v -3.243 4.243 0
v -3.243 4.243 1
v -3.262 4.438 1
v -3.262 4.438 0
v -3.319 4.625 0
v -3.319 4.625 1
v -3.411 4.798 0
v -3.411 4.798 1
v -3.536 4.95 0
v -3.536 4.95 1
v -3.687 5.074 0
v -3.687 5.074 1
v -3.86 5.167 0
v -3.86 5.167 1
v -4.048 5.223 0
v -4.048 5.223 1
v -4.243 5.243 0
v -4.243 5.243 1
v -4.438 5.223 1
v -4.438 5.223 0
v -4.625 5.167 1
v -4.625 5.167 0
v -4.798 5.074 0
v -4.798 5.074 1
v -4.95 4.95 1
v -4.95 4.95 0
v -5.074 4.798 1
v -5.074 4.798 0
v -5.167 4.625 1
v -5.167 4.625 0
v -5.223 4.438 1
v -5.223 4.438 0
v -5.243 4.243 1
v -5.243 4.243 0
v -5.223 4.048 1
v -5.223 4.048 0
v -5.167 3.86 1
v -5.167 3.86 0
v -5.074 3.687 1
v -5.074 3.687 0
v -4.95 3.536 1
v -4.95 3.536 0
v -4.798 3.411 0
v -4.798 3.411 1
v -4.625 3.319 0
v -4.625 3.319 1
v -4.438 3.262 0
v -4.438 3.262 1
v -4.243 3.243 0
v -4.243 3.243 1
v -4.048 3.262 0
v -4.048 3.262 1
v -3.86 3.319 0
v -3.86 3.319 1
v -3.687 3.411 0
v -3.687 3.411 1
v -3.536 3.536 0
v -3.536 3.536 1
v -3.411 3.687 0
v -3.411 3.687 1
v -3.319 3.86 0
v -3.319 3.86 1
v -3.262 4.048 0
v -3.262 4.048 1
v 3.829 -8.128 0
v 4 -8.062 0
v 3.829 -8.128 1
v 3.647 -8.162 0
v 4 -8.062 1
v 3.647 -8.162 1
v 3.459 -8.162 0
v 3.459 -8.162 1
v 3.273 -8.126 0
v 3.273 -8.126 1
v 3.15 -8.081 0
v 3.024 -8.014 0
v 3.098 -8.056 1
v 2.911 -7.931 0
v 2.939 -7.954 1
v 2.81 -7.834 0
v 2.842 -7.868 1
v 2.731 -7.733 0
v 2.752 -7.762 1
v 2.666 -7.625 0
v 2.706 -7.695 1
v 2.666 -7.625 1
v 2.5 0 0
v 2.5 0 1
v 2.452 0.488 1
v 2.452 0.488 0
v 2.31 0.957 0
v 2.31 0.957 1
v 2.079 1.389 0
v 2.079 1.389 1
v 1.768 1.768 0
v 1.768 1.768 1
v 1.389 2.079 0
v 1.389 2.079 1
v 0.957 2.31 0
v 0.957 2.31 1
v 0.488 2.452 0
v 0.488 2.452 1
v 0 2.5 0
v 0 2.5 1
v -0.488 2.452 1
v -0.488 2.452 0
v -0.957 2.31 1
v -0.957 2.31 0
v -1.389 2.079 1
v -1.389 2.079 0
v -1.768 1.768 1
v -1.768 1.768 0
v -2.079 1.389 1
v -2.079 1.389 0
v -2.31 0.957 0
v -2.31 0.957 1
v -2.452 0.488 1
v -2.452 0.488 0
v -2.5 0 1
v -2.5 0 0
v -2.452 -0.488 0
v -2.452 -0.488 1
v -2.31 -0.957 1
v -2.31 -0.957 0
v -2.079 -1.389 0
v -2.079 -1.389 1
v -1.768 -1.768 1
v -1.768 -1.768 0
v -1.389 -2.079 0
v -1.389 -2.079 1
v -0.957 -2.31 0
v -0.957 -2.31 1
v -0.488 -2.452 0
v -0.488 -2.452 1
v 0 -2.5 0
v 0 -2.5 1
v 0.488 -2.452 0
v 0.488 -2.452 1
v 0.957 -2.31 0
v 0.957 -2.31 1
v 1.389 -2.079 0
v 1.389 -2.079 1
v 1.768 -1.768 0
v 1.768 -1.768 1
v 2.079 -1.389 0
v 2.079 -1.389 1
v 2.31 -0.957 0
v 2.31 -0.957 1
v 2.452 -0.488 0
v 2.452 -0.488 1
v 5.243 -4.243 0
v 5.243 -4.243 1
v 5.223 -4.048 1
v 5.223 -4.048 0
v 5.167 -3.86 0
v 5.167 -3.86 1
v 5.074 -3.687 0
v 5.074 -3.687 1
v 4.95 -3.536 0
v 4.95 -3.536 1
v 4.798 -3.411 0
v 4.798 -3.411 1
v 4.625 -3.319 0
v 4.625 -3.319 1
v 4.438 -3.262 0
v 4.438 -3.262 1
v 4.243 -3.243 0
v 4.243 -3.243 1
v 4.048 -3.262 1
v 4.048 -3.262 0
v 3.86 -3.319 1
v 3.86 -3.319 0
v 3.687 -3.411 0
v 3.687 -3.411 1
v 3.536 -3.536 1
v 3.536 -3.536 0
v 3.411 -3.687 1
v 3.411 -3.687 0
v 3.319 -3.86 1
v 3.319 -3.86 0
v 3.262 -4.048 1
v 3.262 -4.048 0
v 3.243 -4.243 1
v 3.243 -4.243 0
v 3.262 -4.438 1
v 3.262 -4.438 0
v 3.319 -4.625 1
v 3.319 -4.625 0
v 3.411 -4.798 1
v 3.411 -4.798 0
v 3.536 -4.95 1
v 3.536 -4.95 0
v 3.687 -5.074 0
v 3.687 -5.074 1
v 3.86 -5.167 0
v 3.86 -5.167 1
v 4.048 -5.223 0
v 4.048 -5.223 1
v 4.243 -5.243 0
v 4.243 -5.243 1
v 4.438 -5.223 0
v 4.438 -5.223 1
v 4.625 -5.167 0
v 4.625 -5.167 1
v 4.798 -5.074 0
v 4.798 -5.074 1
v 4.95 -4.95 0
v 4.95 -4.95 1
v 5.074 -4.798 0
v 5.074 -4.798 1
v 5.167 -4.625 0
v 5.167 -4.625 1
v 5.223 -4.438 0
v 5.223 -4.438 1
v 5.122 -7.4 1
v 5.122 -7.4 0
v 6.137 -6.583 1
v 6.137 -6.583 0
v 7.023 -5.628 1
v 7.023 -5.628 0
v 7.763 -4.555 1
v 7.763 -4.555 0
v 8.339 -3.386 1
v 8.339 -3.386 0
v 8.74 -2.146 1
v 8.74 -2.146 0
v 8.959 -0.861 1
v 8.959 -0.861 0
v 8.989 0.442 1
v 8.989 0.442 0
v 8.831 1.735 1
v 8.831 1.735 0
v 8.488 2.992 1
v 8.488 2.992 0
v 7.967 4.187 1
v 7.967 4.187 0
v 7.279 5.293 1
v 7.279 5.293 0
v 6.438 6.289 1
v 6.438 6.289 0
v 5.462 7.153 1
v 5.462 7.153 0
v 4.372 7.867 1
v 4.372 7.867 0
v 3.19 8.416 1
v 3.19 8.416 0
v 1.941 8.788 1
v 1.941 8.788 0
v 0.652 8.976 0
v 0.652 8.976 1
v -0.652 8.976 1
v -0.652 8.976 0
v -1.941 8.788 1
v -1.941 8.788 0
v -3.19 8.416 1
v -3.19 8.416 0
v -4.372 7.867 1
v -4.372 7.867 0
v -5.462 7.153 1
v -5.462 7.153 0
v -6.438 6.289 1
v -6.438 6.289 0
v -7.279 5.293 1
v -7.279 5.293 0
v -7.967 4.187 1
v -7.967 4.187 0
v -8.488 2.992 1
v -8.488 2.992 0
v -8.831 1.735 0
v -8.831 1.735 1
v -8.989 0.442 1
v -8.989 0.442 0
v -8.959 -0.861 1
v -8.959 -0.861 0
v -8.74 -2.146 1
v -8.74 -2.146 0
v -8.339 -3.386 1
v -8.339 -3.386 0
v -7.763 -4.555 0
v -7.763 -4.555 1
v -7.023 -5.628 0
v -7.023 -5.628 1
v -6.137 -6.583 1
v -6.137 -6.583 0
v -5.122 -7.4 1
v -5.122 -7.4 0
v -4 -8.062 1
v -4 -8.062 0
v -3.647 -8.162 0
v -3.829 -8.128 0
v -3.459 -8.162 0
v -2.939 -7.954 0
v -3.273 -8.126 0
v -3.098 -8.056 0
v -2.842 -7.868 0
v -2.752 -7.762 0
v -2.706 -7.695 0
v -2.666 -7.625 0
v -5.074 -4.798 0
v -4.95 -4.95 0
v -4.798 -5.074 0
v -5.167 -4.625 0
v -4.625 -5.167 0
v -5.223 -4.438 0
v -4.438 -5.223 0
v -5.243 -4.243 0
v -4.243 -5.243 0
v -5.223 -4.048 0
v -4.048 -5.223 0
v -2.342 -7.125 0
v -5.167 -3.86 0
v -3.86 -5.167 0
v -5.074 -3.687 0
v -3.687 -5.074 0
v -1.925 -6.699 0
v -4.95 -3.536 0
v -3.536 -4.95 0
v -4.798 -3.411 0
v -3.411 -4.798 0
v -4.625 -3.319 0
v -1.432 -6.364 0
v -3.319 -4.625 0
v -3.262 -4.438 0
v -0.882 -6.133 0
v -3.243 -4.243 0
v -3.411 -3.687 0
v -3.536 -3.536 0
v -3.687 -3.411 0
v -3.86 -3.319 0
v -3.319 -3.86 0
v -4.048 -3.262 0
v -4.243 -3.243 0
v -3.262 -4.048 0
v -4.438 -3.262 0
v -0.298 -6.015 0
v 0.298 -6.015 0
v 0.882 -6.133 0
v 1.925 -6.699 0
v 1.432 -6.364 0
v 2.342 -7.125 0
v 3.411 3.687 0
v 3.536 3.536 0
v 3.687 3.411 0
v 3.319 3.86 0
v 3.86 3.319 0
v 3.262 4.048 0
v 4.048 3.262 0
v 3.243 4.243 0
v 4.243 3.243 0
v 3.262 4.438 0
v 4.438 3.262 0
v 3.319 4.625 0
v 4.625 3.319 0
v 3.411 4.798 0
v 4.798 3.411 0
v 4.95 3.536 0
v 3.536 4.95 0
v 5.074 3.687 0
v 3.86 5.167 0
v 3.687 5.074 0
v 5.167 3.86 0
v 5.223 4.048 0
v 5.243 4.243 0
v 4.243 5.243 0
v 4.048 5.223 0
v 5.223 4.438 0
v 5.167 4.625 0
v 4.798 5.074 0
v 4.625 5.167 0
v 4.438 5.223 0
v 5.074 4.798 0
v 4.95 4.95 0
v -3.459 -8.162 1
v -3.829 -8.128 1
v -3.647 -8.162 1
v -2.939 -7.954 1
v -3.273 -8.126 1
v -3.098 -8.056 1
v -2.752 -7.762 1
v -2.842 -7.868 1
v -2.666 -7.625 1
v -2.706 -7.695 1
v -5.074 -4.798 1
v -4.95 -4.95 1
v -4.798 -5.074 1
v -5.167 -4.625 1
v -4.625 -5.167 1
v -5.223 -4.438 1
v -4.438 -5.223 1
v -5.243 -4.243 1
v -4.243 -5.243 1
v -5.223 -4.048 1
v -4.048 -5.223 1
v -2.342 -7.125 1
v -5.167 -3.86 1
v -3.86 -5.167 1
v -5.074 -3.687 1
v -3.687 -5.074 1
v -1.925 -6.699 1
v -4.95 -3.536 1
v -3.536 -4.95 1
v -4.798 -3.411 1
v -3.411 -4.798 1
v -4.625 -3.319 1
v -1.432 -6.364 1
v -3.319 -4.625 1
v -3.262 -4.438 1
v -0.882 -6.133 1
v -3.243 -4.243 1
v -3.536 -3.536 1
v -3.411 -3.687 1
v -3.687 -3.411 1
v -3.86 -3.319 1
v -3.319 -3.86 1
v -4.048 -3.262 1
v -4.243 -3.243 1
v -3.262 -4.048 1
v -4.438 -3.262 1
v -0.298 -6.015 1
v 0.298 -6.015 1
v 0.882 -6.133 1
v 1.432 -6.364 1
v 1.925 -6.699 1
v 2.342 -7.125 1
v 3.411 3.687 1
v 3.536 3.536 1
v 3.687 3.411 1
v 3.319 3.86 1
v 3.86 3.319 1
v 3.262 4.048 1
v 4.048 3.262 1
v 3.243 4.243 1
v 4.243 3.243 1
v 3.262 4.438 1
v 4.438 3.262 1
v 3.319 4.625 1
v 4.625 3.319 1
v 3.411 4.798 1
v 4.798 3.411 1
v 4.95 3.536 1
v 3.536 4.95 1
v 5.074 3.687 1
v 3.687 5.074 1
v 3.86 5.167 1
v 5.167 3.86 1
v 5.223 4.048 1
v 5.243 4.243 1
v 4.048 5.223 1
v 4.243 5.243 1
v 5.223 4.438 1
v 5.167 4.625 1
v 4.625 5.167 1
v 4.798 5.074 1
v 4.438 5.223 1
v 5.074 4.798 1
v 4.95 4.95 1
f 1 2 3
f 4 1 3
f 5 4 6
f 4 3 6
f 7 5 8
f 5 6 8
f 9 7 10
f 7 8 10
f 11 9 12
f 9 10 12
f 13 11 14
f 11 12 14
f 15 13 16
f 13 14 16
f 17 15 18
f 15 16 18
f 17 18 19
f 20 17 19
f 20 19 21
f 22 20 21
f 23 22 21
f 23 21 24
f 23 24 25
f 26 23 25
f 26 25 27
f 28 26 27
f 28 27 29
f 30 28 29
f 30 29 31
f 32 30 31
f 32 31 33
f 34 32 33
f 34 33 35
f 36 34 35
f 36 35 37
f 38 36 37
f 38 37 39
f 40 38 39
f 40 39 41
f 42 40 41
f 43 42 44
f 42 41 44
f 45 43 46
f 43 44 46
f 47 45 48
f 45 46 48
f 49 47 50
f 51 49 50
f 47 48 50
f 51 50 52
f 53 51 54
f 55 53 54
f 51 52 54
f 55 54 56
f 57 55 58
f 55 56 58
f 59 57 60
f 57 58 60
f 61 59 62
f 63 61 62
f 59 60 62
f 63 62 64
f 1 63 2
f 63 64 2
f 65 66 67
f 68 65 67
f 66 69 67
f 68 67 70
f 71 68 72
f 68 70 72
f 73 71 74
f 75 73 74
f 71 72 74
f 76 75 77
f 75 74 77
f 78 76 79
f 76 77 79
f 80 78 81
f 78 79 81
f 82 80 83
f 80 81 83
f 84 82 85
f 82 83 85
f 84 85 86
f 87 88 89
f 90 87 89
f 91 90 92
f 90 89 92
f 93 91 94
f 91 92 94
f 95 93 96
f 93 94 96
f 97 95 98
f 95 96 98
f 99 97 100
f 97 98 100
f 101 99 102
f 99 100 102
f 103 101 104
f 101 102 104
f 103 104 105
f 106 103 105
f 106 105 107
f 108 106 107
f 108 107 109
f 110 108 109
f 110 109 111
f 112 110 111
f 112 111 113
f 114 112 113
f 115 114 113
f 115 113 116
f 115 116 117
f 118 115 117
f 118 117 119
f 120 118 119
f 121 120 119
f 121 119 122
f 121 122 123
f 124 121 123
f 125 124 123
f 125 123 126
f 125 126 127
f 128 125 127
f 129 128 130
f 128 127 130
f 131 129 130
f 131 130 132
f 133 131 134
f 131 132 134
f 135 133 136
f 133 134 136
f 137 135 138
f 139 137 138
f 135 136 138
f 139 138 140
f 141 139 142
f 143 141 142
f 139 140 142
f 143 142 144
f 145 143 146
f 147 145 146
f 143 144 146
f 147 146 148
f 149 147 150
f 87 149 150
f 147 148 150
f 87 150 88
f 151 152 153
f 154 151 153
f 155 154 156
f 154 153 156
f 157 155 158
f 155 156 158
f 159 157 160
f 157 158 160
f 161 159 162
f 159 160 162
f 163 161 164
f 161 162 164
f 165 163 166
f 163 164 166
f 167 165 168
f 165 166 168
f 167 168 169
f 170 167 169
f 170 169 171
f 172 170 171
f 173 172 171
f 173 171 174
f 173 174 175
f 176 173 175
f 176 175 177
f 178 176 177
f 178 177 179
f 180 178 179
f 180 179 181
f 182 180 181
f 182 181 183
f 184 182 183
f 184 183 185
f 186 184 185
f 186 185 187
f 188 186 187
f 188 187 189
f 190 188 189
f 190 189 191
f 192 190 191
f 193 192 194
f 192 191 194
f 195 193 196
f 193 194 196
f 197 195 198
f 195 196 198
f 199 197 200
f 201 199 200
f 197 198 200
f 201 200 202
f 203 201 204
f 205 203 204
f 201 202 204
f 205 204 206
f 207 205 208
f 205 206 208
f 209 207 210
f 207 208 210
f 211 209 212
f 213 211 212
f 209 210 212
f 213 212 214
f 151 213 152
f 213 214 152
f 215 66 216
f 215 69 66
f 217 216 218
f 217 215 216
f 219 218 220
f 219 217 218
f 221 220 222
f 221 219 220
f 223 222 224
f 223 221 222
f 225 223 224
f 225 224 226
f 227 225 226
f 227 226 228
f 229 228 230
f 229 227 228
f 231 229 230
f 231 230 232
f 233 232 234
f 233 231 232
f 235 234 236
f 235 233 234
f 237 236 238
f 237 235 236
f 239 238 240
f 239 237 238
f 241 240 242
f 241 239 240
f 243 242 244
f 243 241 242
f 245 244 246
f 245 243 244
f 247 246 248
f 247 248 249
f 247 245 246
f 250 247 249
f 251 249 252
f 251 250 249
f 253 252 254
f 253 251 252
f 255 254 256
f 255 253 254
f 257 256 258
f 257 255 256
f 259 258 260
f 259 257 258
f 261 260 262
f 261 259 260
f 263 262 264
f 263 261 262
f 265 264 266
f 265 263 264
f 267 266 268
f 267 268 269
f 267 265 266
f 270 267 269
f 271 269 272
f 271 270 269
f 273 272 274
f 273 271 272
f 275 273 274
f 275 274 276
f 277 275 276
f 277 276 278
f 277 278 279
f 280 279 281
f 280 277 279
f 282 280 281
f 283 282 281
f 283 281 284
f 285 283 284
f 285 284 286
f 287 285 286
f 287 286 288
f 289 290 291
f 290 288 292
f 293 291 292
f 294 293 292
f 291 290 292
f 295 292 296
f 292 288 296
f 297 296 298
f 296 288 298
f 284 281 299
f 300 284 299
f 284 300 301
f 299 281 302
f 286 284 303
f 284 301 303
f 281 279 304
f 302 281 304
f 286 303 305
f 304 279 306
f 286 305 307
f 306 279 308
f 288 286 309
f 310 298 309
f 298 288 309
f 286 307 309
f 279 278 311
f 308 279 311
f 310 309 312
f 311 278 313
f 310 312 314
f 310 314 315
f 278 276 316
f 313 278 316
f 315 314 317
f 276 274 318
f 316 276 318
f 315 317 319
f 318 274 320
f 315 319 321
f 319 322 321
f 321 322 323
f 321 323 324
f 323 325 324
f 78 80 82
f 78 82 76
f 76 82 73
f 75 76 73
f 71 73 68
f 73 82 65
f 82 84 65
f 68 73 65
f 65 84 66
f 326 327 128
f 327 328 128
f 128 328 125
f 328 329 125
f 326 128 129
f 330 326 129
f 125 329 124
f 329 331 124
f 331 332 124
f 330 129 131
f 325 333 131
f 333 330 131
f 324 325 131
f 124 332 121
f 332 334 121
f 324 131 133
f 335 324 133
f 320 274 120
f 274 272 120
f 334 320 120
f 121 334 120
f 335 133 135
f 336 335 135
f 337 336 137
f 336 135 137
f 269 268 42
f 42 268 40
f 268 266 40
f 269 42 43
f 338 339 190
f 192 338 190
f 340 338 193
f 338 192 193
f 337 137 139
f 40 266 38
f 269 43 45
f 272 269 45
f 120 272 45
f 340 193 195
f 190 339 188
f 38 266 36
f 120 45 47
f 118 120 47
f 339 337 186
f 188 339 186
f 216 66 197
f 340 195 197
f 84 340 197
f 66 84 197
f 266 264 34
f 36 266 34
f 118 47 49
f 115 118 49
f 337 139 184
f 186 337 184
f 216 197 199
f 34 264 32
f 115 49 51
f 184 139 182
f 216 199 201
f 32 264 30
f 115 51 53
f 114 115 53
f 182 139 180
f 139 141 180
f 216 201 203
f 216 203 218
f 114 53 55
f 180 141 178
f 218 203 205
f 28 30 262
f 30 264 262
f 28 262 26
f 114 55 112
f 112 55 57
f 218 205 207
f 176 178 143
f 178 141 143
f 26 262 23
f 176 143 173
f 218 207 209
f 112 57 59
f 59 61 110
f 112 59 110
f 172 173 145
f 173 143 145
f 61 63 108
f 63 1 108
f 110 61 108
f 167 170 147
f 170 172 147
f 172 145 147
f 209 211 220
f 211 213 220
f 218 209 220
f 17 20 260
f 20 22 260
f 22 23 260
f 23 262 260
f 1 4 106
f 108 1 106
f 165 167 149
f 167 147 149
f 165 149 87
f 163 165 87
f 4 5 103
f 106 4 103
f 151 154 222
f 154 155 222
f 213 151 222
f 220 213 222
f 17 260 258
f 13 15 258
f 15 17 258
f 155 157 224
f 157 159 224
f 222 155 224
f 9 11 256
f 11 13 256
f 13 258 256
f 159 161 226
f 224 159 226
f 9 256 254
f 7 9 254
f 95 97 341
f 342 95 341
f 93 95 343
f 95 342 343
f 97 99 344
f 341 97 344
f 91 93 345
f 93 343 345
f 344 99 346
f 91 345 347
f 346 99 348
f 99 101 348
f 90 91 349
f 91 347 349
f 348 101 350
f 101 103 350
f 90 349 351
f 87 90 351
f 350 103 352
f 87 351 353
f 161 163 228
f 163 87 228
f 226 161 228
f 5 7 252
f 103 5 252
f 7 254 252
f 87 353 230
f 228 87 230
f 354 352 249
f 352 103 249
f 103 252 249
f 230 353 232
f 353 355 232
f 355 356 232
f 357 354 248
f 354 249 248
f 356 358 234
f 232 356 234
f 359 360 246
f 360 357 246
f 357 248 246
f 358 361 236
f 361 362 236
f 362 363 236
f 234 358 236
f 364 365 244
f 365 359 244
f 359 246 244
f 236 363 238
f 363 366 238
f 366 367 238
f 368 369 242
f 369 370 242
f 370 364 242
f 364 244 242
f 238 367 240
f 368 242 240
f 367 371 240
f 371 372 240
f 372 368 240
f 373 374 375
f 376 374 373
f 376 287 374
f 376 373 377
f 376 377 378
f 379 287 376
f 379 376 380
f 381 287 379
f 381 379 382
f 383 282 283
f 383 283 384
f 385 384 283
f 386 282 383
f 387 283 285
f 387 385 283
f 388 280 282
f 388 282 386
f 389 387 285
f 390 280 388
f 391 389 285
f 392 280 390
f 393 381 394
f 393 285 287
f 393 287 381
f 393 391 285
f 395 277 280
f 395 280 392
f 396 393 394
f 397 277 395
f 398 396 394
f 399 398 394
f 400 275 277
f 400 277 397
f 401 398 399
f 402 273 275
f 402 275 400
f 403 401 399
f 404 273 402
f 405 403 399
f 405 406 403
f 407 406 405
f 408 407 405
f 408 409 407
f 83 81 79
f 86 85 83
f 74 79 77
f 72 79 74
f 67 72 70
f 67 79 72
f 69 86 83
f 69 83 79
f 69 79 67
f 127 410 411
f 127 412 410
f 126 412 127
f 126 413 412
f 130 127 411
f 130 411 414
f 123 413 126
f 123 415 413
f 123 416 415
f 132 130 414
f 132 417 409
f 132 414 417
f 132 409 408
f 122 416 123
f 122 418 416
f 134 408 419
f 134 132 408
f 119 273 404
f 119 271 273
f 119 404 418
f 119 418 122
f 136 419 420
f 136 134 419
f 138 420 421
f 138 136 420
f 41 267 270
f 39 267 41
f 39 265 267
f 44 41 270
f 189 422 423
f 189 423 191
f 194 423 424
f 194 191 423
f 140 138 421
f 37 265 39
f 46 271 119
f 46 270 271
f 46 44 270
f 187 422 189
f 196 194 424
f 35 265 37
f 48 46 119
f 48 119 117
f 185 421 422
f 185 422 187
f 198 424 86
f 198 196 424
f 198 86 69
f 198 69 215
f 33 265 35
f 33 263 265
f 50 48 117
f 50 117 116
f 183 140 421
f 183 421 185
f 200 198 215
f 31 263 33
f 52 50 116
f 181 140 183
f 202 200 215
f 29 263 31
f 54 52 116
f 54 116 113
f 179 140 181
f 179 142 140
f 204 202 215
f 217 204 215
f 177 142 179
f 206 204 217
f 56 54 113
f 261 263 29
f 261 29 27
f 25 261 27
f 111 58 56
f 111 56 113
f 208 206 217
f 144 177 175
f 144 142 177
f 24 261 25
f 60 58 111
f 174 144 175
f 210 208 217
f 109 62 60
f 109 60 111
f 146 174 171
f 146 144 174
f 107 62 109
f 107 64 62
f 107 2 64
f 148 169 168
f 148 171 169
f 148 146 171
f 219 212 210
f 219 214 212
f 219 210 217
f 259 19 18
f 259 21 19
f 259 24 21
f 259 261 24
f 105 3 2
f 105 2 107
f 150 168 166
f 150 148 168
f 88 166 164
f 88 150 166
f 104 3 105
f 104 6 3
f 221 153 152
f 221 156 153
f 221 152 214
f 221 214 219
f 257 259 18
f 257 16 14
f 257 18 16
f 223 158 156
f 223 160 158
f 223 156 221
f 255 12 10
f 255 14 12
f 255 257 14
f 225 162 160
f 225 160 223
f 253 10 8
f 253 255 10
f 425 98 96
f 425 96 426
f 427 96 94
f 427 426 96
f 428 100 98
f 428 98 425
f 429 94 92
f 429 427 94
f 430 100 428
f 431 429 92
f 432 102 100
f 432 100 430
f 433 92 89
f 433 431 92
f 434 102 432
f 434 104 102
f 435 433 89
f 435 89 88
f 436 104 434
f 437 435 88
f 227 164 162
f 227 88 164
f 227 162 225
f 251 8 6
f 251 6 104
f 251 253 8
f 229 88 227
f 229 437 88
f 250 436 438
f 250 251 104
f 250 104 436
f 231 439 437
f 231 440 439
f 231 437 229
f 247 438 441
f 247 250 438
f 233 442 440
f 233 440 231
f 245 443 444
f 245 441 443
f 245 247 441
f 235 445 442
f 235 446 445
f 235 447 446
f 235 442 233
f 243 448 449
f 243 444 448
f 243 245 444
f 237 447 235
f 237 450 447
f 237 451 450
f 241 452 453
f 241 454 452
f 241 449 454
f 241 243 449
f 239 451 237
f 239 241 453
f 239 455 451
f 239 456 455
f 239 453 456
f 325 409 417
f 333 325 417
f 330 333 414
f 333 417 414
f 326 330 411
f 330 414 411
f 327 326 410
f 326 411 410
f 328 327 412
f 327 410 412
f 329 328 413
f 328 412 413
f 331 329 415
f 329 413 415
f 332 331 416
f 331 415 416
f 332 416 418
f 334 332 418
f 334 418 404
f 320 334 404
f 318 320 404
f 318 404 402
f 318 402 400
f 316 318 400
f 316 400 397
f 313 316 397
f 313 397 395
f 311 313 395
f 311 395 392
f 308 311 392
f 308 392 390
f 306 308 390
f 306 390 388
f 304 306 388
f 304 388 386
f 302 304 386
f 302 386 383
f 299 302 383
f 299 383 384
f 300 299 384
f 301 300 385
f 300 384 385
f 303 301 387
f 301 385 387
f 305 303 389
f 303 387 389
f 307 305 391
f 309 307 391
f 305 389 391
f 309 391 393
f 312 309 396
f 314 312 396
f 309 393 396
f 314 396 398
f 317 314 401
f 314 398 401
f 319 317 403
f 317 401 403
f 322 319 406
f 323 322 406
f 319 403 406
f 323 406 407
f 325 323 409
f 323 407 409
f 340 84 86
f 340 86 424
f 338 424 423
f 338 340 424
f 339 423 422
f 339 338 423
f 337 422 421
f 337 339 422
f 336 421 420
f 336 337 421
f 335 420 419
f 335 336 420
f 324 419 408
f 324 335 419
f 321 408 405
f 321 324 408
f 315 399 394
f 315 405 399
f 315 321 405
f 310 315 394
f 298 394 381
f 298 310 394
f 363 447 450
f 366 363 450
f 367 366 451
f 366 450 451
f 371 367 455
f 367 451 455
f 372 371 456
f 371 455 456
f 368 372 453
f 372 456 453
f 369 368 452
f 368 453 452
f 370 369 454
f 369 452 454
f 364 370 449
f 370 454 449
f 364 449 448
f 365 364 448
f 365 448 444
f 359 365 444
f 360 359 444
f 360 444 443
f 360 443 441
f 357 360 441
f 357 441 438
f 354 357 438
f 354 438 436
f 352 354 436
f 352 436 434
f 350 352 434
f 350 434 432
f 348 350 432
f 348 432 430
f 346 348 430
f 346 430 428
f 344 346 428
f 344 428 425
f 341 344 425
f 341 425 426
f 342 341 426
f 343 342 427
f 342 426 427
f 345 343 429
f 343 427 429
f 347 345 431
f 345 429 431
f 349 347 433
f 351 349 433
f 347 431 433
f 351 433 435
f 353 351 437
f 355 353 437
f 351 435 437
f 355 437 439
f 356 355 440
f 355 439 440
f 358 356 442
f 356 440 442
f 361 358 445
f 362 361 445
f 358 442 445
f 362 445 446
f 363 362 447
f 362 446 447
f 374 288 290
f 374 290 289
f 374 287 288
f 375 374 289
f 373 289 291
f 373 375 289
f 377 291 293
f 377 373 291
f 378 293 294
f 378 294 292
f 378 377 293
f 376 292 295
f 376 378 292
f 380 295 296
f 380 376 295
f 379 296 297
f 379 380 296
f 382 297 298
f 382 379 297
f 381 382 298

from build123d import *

# Parameters (mm, degrees)
F0_R     = 9
F0_R_2   = 1
F0_R_3   = 2.5
F2_R     = 3
F4_DEPTH = 1.001
F5_R     = 1


with BuildPart() as f3:
    # F3: sweep along a path in F1
    with BuildLine(Plane.XZ) as f3_path:
        Line((0, 0), (0, 1))
    # F0 (on Top) → F3 (sweep)
    with BuildSketch(Plane.XY):
        Circle(F0_R)
        with Locations((-4.2426406871, -4.2426406871)):
            Circle(F0_R_2, mode=Mode.SUBTRACT)
        with Locations((4.2426406871, -4.2426406871)):
            Circle(F0_R_2, mode=Mode.SUBTRACT)
        with Locations((-4.2426406871, 4.2426406871)):
            Circle(F0_R_2, mode=Mode.SUBTRACT)
        Circle(F0_R_3, mode=Mode.SUBTRACT)
        with Locations((4.2426406871, 4.2426406871)):
            Circle(F0_R_2, mode=Mode.SUBTRACT)
    sweep(path=f3_path.line)

    # F2 (on Top) → F4 (cut, through all)
    with BuildSketch(Plane.XY):
        with Locations((0, -9)):
            Circle(F2_R)
    extrude(amount=F4_DEPTH, mode=Mode.SUBTRACT)

    # F5
    f5_edges = [f3.edges().sort_by_distance(p)[0] for p in [
        (-2.95804, -8.5, 0.5),
        (2.95804, -8.5, 0.5),
    ]]
    fillet(f5_edges, radius=F5_R)


solid = f3.part
